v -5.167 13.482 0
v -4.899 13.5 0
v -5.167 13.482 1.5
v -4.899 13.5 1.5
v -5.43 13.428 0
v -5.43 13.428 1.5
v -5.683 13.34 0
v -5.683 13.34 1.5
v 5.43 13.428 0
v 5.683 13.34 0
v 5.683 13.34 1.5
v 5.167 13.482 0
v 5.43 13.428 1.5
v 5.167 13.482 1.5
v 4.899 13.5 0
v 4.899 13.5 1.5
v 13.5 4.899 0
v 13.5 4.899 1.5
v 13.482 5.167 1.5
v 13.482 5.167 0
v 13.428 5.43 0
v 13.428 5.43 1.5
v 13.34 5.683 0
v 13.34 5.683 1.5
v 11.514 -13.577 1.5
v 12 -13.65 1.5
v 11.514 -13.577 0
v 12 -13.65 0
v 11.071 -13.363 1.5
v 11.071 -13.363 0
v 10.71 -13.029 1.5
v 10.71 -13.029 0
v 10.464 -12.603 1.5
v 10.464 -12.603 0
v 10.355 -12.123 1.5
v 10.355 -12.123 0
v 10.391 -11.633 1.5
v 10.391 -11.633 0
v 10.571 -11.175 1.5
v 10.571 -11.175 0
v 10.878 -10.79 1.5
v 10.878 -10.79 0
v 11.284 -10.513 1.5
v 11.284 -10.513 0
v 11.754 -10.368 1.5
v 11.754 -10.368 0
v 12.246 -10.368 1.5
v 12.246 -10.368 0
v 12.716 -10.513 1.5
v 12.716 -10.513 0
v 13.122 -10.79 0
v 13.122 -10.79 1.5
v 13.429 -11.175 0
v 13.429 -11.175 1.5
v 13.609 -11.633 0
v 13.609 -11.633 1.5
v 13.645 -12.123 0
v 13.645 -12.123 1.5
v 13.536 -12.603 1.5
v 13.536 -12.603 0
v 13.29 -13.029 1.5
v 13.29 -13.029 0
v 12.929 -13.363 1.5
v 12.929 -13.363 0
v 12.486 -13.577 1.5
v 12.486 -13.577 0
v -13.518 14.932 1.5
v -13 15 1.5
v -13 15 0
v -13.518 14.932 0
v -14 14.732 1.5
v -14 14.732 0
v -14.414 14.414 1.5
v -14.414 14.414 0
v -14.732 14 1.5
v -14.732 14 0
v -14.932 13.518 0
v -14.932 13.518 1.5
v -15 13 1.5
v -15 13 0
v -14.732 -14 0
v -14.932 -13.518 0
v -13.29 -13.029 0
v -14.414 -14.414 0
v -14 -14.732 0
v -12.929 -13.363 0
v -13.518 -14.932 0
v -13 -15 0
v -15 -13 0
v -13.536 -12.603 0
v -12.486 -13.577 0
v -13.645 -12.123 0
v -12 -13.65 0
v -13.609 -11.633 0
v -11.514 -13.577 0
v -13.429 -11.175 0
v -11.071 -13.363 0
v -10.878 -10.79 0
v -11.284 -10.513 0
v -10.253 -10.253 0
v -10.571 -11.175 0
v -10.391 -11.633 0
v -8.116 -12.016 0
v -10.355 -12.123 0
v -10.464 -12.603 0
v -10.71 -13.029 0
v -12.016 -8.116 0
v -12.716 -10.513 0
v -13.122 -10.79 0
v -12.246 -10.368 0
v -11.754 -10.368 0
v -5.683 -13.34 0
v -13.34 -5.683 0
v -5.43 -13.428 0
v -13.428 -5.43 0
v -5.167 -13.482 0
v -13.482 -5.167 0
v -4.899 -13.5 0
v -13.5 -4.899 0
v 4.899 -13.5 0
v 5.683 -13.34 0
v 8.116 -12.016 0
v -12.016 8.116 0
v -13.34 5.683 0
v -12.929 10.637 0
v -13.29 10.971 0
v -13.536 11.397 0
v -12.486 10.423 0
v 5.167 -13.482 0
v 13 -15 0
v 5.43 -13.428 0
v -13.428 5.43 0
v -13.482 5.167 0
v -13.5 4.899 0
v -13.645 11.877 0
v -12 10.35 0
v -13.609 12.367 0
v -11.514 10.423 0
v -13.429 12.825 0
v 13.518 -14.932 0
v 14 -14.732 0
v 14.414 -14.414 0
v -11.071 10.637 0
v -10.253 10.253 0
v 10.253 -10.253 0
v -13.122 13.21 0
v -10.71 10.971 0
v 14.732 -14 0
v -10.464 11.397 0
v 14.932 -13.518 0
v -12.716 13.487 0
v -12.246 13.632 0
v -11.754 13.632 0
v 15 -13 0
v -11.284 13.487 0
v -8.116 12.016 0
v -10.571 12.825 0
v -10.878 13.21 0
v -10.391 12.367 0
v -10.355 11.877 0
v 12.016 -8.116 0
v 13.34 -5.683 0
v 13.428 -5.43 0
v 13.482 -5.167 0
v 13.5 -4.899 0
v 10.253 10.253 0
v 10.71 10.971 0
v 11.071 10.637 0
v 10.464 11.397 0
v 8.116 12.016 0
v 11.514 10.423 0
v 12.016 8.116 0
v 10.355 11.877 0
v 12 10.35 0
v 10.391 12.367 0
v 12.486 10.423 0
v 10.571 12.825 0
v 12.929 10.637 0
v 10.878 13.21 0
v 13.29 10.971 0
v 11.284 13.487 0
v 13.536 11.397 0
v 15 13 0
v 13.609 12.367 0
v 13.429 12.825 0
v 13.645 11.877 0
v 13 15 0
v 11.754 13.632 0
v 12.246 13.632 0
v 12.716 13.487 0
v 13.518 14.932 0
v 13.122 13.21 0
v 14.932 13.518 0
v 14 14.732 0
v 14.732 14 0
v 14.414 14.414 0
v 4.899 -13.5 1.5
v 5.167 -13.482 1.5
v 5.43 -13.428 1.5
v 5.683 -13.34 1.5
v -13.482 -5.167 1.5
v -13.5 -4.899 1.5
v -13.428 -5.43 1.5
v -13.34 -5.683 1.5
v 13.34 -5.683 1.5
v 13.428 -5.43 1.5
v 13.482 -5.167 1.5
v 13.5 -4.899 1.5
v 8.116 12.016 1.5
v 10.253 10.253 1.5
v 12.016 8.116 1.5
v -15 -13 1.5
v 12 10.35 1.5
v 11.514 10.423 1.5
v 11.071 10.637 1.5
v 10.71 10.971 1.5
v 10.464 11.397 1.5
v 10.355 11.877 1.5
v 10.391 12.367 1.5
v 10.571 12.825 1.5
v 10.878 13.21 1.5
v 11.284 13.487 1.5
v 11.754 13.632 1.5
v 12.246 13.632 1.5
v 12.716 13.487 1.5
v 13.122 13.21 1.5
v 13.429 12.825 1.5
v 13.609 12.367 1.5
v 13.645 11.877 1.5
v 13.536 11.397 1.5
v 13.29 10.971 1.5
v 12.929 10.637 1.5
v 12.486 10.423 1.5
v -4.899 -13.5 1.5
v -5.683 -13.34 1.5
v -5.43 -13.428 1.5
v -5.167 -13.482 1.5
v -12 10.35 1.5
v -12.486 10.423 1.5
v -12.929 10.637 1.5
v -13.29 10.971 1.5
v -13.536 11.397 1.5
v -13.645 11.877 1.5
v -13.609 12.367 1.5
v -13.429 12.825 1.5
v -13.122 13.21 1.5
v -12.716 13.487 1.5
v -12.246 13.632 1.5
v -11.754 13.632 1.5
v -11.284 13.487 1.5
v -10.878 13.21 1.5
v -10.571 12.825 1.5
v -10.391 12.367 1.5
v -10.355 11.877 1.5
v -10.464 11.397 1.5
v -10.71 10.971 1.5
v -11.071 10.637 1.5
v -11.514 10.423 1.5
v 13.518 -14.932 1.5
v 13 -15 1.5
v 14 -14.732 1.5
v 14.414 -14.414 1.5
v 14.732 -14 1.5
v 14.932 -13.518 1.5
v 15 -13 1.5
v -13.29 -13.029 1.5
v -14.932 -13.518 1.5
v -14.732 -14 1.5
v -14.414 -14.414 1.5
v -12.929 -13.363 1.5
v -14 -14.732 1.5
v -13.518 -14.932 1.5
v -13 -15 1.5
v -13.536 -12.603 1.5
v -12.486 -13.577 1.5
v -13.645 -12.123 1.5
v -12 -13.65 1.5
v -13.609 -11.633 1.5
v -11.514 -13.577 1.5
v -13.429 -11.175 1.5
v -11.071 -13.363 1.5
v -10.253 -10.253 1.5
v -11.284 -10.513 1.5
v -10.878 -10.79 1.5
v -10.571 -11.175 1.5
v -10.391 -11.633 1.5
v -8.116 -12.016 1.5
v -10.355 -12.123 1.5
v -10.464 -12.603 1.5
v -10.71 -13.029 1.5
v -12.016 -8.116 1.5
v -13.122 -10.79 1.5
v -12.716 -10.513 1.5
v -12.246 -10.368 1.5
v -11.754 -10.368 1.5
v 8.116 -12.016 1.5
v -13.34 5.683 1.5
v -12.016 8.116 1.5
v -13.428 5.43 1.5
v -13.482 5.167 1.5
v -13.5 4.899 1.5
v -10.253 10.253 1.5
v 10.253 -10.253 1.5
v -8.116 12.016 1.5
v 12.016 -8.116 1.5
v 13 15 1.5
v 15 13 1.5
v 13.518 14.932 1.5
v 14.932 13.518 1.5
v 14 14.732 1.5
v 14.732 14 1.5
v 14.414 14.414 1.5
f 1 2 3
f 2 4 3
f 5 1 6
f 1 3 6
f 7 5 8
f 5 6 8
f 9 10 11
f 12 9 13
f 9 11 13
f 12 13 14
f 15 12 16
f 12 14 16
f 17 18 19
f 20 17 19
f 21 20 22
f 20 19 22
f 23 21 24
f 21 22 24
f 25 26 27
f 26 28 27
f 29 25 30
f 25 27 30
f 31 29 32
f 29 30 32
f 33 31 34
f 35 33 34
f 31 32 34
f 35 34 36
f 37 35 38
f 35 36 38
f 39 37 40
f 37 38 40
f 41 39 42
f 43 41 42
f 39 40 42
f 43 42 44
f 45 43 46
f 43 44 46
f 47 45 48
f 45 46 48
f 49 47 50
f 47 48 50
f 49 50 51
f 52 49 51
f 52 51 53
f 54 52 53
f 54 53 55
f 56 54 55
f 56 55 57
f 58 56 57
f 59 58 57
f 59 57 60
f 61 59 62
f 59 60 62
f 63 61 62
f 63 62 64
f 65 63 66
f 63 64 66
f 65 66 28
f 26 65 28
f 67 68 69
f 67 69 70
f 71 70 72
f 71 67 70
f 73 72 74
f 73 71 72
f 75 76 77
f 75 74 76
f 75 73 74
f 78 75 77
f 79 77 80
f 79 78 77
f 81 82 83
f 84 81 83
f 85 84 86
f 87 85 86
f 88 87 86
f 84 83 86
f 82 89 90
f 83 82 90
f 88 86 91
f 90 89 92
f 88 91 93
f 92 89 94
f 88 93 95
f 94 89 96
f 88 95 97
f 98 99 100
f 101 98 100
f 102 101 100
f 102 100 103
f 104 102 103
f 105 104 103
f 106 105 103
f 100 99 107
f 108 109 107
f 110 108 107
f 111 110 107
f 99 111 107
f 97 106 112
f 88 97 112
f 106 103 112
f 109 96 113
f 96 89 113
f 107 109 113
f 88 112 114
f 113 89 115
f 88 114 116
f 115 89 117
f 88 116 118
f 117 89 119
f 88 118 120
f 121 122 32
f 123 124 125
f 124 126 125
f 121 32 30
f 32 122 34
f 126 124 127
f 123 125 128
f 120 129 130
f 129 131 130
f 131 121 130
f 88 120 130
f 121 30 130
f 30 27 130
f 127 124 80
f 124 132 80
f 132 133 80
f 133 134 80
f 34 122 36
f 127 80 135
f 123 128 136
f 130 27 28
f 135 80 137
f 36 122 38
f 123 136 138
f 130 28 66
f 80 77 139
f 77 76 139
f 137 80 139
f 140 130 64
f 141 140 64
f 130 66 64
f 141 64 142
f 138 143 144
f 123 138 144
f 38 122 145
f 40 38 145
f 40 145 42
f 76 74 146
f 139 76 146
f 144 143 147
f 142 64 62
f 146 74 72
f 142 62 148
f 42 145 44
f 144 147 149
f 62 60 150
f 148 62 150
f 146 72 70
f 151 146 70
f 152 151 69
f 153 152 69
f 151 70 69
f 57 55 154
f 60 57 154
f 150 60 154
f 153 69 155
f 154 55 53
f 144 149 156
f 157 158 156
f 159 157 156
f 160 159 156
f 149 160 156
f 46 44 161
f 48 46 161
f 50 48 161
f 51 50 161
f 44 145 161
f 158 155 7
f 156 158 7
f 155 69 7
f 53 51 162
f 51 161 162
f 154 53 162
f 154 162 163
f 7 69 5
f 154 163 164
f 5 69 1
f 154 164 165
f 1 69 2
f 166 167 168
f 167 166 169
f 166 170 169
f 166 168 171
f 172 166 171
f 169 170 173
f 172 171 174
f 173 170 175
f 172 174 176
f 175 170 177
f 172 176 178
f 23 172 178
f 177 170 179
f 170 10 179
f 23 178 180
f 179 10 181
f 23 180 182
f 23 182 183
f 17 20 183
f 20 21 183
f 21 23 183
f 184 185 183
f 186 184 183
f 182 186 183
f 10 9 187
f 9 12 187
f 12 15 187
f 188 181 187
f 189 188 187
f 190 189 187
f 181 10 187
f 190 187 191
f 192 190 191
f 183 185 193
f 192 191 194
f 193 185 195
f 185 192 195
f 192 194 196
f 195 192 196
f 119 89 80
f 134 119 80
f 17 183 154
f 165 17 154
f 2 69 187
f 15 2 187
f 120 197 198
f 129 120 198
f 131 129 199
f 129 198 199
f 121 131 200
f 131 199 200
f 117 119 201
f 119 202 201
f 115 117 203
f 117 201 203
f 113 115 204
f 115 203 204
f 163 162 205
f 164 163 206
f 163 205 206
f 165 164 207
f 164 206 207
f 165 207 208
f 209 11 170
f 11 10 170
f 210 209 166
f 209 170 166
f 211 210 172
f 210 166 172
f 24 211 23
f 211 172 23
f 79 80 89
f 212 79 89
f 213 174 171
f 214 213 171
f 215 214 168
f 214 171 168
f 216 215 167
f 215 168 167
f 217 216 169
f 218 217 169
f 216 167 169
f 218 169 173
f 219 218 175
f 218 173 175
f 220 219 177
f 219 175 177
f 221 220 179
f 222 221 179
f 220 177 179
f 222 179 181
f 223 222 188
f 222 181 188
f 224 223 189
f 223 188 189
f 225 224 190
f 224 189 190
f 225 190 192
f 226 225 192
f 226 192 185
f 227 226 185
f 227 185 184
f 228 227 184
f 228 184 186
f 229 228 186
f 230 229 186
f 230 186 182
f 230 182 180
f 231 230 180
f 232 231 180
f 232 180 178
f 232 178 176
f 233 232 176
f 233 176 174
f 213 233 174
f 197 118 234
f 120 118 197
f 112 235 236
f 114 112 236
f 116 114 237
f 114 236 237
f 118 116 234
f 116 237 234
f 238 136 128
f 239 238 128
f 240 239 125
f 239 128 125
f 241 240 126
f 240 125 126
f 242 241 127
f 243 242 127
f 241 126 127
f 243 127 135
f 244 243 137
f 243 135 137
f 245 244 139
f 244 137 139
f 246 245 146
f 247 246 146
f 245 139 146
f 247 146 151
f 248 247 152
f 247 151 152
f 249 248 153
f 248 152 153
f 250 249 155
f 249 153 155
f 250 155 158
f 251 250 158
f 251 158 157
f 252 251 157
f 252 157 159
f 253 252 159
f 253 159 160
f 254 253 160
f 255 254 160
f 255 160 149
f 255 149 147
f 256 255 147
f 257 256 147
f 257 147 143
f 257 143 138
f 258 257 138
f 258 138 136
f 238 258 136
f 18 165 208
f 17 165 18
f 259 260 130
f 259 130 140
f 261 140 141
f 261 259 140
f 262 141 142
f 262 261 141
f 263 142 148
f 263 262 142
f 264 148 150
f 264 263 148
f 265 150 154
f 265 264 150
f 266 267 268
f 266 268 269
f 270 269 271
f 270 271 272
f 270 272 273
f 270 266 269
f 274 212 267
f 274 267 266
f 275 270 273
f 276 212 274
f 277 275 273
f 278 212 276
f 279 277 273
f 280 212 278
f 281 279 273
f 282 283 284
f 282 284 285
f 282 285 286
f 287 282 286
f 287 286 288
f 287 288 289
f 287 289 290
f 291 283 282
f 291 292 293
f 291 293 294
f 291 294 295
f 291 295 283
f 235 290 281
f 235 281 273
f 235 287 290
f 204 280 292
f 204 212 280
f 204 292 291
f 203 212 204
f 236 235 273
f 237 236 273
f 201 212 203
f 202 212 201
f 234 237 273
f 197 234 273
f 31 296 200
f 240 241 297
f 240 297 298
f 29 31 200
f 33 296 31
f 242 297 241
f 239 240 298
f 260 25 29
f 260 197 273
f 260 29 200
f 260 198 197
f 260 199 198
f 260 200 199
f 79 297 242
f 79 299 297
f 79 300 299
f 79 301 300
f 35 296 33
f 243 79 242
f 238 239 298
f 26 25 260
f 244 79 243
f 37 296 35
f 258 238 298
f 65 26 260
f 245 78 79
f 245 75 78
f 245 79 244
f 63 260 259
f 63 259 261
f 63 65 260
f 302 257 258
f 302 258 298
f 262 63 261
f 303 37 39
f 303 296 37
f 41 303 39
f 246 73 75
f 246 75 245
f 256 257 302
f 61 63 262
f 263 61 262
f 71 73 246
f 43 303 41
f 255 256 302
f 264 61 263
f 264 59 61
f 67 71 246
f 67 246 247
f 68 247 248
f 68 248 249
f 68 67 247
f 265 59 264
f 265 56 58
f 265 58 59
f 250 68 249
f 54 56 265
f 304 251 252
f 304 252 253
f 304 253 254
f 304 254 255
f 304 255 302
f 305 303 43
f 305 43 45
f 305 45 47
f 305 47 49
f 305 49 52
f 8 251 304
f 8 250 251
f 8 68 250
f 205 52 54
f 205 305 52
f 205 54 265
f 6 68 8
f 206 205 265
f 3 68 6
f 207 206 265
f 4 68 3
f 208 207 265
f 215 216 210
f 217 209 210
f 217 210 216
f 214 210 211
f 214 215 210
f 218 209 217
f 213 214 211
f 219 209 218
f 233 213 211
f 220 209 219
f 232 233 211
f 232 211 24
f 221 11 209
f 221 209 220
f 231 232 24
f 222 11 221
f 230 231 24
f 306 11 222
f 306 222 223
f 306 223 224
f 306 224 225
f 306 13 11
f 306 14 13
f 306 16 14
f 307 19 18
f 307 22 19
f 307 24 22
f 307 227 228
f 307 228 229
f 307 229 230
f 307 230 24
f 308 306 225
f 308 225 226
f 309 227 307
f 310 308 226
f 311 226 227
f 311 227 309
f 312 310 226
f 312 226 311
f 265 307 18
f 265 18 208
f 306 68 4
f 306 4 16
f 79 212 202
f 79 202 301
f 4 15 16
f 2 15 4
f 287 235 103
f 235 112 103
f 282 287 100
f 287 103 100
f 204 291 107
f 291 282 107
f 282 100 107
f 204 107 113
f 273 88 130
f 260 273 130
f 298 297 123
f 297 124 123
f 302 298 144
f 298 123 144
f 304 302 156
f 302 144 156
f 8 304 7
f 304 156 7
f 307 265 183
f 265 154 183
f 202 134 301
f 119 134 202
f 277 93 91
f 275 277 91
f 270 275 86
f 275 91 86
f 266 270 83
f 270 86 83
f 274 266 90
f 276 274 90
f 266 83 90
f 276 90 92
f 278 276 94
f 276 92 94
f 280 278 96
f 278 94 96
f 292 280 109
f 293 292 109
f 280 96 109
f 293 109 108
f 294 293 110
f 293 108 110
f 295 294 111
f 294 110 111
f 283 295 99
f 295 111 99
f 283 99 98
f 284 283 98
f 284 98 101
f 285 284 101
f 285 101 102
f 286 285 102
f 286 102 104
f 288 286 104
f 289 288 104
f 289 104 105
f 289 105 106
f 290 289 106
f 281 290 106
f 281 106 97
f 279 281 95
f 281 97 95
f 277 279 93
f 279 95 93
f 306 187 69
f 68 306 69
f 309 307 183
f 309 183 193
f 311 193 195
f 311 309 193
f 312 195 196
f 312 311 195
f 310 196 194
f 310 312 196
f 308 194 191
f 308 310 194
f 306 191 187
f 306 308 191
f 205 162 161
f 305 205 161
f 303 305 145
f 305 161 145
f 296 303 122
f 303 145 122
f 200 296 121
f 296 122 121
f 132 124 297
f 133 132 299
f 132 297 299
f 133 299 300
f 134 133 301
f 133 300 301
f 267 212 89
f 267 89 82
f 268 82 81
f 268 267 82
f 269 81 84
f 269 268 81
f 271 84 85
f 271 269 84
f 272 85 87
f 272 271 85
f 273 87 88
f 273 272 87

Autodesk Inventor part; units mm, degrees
ref_plane "YZ Plane" through (0, 0, 0) normal (1, 0, 0) x (0, 1, 0)
ref_plane "XZ Plane" through (0, 0, 0) normal (0, 1, 0) x (-1, 0, 0)
ref_plane "XY Plane" through (0, 0, 0) normal (0, 0, 1) x (1, 0, 0)
sketch "Sketch1" plane through (0, 0, 0) normal (0, 0, 1) x (1, 0, 0)
  line L0 (-15, -15) -> (15, -15)
  line L1 (15, -15) -> (15, 15)
  line L2 (15, 15) -> (-15, 15)
  line L3 (-15, 15) -> (-15, -15)
  line L4 (-15, -15) -> (15, 15) construction
  line L5 (15, -15) -> (-15, 15) construction
  line L6 (-13.5, -13.5) -> (13.5, -13.5)
  line L7 (13.5, -13.5) -> (13.5, 13.5)
  line L8 (13.5, 13.5) -> (-13.5, 13.5)
  line L9 (-13.5, 13.5) -> (-13.5, -13.5)
  line L10 (-13.5, -13.5) -> (13.5, 13.5) construction
  line L11 (13.5, -13.5) -> (-13.5, 13.5) construction
  circle A0 centre (0, 0) radius 14.5
  point P0 (5.2915, -13.5)
  point P1 (-5.2915, -13.5)
  point P2 (-13.5, -5.2915)
  point P3 (-13.5, 5.2915)
  point P4 (-5.2915, 13.5)
  point P5 (5.2915, 13.5)
  point P6 (13.5, 5.2915)
  point P7 (13.5, -5.2915)
  dimension "d0" = 30
  dimension "d1" = 30
  dimension "d2" = 27
  dimension "d3" = 27
  dimension "d4" = 29
extrude "Extrusion1" add sketch "Sketch1" along normal blind 1.5 contours L3 L2 L1 L0 | L9 A0 L6 | L6 A0 | A0 L9 | A0 L7 L6 | L9 L8 A0 | L7 A0 | A0 L8 | A0 L8 L7
fillet "Fillet1" radius 2 12 edges at (15, -15, 0.75) (15, 15, 0.75) (5.2915, 13.5, 0.75) (-13.5, 5.2915, 0.75) (-15, -15, 0.75) (-15, 15, 0.75) (13.5, 5.2915, 0.75) (-5.2915, 13.5, 0.75) (-5.2915, -13.5, 0.75) (-13.5, -5.2915, 0.75) (5.2915, -13.5, 0.75) (13.5, -5.2915, 0.75)
sketch "Sketch2" plane through (0, 0, 1.5) normal (0, 0, 1) x (1, 0, 0)
  line L0 (-12, -12) -> (12, -12) construction
  line L1 (12, -12) -> (12, 12) construction
  line L2 (12, 12) -> (-12, 12) construction
  line L3 (-12, 12) -> (-12, -12) construction
  line L4 (-12, -12) -> (12, 12) construction
  line L5 (12, -12) -> (-12, 12) construction
  point P0 (0, 0)
  dimension "d8" = 24
  dimension "d9" = 24
hole "Hole1" at (-12, 12, 1.5) at (12, 12, 1.5) at (12, -12, 1.5) at (-12, -12, 1.5) direction (0, 0, -1) diameter 3.3 end through all
properties part number "Hotend Cooling Fan Bracket" material "Rubber"
